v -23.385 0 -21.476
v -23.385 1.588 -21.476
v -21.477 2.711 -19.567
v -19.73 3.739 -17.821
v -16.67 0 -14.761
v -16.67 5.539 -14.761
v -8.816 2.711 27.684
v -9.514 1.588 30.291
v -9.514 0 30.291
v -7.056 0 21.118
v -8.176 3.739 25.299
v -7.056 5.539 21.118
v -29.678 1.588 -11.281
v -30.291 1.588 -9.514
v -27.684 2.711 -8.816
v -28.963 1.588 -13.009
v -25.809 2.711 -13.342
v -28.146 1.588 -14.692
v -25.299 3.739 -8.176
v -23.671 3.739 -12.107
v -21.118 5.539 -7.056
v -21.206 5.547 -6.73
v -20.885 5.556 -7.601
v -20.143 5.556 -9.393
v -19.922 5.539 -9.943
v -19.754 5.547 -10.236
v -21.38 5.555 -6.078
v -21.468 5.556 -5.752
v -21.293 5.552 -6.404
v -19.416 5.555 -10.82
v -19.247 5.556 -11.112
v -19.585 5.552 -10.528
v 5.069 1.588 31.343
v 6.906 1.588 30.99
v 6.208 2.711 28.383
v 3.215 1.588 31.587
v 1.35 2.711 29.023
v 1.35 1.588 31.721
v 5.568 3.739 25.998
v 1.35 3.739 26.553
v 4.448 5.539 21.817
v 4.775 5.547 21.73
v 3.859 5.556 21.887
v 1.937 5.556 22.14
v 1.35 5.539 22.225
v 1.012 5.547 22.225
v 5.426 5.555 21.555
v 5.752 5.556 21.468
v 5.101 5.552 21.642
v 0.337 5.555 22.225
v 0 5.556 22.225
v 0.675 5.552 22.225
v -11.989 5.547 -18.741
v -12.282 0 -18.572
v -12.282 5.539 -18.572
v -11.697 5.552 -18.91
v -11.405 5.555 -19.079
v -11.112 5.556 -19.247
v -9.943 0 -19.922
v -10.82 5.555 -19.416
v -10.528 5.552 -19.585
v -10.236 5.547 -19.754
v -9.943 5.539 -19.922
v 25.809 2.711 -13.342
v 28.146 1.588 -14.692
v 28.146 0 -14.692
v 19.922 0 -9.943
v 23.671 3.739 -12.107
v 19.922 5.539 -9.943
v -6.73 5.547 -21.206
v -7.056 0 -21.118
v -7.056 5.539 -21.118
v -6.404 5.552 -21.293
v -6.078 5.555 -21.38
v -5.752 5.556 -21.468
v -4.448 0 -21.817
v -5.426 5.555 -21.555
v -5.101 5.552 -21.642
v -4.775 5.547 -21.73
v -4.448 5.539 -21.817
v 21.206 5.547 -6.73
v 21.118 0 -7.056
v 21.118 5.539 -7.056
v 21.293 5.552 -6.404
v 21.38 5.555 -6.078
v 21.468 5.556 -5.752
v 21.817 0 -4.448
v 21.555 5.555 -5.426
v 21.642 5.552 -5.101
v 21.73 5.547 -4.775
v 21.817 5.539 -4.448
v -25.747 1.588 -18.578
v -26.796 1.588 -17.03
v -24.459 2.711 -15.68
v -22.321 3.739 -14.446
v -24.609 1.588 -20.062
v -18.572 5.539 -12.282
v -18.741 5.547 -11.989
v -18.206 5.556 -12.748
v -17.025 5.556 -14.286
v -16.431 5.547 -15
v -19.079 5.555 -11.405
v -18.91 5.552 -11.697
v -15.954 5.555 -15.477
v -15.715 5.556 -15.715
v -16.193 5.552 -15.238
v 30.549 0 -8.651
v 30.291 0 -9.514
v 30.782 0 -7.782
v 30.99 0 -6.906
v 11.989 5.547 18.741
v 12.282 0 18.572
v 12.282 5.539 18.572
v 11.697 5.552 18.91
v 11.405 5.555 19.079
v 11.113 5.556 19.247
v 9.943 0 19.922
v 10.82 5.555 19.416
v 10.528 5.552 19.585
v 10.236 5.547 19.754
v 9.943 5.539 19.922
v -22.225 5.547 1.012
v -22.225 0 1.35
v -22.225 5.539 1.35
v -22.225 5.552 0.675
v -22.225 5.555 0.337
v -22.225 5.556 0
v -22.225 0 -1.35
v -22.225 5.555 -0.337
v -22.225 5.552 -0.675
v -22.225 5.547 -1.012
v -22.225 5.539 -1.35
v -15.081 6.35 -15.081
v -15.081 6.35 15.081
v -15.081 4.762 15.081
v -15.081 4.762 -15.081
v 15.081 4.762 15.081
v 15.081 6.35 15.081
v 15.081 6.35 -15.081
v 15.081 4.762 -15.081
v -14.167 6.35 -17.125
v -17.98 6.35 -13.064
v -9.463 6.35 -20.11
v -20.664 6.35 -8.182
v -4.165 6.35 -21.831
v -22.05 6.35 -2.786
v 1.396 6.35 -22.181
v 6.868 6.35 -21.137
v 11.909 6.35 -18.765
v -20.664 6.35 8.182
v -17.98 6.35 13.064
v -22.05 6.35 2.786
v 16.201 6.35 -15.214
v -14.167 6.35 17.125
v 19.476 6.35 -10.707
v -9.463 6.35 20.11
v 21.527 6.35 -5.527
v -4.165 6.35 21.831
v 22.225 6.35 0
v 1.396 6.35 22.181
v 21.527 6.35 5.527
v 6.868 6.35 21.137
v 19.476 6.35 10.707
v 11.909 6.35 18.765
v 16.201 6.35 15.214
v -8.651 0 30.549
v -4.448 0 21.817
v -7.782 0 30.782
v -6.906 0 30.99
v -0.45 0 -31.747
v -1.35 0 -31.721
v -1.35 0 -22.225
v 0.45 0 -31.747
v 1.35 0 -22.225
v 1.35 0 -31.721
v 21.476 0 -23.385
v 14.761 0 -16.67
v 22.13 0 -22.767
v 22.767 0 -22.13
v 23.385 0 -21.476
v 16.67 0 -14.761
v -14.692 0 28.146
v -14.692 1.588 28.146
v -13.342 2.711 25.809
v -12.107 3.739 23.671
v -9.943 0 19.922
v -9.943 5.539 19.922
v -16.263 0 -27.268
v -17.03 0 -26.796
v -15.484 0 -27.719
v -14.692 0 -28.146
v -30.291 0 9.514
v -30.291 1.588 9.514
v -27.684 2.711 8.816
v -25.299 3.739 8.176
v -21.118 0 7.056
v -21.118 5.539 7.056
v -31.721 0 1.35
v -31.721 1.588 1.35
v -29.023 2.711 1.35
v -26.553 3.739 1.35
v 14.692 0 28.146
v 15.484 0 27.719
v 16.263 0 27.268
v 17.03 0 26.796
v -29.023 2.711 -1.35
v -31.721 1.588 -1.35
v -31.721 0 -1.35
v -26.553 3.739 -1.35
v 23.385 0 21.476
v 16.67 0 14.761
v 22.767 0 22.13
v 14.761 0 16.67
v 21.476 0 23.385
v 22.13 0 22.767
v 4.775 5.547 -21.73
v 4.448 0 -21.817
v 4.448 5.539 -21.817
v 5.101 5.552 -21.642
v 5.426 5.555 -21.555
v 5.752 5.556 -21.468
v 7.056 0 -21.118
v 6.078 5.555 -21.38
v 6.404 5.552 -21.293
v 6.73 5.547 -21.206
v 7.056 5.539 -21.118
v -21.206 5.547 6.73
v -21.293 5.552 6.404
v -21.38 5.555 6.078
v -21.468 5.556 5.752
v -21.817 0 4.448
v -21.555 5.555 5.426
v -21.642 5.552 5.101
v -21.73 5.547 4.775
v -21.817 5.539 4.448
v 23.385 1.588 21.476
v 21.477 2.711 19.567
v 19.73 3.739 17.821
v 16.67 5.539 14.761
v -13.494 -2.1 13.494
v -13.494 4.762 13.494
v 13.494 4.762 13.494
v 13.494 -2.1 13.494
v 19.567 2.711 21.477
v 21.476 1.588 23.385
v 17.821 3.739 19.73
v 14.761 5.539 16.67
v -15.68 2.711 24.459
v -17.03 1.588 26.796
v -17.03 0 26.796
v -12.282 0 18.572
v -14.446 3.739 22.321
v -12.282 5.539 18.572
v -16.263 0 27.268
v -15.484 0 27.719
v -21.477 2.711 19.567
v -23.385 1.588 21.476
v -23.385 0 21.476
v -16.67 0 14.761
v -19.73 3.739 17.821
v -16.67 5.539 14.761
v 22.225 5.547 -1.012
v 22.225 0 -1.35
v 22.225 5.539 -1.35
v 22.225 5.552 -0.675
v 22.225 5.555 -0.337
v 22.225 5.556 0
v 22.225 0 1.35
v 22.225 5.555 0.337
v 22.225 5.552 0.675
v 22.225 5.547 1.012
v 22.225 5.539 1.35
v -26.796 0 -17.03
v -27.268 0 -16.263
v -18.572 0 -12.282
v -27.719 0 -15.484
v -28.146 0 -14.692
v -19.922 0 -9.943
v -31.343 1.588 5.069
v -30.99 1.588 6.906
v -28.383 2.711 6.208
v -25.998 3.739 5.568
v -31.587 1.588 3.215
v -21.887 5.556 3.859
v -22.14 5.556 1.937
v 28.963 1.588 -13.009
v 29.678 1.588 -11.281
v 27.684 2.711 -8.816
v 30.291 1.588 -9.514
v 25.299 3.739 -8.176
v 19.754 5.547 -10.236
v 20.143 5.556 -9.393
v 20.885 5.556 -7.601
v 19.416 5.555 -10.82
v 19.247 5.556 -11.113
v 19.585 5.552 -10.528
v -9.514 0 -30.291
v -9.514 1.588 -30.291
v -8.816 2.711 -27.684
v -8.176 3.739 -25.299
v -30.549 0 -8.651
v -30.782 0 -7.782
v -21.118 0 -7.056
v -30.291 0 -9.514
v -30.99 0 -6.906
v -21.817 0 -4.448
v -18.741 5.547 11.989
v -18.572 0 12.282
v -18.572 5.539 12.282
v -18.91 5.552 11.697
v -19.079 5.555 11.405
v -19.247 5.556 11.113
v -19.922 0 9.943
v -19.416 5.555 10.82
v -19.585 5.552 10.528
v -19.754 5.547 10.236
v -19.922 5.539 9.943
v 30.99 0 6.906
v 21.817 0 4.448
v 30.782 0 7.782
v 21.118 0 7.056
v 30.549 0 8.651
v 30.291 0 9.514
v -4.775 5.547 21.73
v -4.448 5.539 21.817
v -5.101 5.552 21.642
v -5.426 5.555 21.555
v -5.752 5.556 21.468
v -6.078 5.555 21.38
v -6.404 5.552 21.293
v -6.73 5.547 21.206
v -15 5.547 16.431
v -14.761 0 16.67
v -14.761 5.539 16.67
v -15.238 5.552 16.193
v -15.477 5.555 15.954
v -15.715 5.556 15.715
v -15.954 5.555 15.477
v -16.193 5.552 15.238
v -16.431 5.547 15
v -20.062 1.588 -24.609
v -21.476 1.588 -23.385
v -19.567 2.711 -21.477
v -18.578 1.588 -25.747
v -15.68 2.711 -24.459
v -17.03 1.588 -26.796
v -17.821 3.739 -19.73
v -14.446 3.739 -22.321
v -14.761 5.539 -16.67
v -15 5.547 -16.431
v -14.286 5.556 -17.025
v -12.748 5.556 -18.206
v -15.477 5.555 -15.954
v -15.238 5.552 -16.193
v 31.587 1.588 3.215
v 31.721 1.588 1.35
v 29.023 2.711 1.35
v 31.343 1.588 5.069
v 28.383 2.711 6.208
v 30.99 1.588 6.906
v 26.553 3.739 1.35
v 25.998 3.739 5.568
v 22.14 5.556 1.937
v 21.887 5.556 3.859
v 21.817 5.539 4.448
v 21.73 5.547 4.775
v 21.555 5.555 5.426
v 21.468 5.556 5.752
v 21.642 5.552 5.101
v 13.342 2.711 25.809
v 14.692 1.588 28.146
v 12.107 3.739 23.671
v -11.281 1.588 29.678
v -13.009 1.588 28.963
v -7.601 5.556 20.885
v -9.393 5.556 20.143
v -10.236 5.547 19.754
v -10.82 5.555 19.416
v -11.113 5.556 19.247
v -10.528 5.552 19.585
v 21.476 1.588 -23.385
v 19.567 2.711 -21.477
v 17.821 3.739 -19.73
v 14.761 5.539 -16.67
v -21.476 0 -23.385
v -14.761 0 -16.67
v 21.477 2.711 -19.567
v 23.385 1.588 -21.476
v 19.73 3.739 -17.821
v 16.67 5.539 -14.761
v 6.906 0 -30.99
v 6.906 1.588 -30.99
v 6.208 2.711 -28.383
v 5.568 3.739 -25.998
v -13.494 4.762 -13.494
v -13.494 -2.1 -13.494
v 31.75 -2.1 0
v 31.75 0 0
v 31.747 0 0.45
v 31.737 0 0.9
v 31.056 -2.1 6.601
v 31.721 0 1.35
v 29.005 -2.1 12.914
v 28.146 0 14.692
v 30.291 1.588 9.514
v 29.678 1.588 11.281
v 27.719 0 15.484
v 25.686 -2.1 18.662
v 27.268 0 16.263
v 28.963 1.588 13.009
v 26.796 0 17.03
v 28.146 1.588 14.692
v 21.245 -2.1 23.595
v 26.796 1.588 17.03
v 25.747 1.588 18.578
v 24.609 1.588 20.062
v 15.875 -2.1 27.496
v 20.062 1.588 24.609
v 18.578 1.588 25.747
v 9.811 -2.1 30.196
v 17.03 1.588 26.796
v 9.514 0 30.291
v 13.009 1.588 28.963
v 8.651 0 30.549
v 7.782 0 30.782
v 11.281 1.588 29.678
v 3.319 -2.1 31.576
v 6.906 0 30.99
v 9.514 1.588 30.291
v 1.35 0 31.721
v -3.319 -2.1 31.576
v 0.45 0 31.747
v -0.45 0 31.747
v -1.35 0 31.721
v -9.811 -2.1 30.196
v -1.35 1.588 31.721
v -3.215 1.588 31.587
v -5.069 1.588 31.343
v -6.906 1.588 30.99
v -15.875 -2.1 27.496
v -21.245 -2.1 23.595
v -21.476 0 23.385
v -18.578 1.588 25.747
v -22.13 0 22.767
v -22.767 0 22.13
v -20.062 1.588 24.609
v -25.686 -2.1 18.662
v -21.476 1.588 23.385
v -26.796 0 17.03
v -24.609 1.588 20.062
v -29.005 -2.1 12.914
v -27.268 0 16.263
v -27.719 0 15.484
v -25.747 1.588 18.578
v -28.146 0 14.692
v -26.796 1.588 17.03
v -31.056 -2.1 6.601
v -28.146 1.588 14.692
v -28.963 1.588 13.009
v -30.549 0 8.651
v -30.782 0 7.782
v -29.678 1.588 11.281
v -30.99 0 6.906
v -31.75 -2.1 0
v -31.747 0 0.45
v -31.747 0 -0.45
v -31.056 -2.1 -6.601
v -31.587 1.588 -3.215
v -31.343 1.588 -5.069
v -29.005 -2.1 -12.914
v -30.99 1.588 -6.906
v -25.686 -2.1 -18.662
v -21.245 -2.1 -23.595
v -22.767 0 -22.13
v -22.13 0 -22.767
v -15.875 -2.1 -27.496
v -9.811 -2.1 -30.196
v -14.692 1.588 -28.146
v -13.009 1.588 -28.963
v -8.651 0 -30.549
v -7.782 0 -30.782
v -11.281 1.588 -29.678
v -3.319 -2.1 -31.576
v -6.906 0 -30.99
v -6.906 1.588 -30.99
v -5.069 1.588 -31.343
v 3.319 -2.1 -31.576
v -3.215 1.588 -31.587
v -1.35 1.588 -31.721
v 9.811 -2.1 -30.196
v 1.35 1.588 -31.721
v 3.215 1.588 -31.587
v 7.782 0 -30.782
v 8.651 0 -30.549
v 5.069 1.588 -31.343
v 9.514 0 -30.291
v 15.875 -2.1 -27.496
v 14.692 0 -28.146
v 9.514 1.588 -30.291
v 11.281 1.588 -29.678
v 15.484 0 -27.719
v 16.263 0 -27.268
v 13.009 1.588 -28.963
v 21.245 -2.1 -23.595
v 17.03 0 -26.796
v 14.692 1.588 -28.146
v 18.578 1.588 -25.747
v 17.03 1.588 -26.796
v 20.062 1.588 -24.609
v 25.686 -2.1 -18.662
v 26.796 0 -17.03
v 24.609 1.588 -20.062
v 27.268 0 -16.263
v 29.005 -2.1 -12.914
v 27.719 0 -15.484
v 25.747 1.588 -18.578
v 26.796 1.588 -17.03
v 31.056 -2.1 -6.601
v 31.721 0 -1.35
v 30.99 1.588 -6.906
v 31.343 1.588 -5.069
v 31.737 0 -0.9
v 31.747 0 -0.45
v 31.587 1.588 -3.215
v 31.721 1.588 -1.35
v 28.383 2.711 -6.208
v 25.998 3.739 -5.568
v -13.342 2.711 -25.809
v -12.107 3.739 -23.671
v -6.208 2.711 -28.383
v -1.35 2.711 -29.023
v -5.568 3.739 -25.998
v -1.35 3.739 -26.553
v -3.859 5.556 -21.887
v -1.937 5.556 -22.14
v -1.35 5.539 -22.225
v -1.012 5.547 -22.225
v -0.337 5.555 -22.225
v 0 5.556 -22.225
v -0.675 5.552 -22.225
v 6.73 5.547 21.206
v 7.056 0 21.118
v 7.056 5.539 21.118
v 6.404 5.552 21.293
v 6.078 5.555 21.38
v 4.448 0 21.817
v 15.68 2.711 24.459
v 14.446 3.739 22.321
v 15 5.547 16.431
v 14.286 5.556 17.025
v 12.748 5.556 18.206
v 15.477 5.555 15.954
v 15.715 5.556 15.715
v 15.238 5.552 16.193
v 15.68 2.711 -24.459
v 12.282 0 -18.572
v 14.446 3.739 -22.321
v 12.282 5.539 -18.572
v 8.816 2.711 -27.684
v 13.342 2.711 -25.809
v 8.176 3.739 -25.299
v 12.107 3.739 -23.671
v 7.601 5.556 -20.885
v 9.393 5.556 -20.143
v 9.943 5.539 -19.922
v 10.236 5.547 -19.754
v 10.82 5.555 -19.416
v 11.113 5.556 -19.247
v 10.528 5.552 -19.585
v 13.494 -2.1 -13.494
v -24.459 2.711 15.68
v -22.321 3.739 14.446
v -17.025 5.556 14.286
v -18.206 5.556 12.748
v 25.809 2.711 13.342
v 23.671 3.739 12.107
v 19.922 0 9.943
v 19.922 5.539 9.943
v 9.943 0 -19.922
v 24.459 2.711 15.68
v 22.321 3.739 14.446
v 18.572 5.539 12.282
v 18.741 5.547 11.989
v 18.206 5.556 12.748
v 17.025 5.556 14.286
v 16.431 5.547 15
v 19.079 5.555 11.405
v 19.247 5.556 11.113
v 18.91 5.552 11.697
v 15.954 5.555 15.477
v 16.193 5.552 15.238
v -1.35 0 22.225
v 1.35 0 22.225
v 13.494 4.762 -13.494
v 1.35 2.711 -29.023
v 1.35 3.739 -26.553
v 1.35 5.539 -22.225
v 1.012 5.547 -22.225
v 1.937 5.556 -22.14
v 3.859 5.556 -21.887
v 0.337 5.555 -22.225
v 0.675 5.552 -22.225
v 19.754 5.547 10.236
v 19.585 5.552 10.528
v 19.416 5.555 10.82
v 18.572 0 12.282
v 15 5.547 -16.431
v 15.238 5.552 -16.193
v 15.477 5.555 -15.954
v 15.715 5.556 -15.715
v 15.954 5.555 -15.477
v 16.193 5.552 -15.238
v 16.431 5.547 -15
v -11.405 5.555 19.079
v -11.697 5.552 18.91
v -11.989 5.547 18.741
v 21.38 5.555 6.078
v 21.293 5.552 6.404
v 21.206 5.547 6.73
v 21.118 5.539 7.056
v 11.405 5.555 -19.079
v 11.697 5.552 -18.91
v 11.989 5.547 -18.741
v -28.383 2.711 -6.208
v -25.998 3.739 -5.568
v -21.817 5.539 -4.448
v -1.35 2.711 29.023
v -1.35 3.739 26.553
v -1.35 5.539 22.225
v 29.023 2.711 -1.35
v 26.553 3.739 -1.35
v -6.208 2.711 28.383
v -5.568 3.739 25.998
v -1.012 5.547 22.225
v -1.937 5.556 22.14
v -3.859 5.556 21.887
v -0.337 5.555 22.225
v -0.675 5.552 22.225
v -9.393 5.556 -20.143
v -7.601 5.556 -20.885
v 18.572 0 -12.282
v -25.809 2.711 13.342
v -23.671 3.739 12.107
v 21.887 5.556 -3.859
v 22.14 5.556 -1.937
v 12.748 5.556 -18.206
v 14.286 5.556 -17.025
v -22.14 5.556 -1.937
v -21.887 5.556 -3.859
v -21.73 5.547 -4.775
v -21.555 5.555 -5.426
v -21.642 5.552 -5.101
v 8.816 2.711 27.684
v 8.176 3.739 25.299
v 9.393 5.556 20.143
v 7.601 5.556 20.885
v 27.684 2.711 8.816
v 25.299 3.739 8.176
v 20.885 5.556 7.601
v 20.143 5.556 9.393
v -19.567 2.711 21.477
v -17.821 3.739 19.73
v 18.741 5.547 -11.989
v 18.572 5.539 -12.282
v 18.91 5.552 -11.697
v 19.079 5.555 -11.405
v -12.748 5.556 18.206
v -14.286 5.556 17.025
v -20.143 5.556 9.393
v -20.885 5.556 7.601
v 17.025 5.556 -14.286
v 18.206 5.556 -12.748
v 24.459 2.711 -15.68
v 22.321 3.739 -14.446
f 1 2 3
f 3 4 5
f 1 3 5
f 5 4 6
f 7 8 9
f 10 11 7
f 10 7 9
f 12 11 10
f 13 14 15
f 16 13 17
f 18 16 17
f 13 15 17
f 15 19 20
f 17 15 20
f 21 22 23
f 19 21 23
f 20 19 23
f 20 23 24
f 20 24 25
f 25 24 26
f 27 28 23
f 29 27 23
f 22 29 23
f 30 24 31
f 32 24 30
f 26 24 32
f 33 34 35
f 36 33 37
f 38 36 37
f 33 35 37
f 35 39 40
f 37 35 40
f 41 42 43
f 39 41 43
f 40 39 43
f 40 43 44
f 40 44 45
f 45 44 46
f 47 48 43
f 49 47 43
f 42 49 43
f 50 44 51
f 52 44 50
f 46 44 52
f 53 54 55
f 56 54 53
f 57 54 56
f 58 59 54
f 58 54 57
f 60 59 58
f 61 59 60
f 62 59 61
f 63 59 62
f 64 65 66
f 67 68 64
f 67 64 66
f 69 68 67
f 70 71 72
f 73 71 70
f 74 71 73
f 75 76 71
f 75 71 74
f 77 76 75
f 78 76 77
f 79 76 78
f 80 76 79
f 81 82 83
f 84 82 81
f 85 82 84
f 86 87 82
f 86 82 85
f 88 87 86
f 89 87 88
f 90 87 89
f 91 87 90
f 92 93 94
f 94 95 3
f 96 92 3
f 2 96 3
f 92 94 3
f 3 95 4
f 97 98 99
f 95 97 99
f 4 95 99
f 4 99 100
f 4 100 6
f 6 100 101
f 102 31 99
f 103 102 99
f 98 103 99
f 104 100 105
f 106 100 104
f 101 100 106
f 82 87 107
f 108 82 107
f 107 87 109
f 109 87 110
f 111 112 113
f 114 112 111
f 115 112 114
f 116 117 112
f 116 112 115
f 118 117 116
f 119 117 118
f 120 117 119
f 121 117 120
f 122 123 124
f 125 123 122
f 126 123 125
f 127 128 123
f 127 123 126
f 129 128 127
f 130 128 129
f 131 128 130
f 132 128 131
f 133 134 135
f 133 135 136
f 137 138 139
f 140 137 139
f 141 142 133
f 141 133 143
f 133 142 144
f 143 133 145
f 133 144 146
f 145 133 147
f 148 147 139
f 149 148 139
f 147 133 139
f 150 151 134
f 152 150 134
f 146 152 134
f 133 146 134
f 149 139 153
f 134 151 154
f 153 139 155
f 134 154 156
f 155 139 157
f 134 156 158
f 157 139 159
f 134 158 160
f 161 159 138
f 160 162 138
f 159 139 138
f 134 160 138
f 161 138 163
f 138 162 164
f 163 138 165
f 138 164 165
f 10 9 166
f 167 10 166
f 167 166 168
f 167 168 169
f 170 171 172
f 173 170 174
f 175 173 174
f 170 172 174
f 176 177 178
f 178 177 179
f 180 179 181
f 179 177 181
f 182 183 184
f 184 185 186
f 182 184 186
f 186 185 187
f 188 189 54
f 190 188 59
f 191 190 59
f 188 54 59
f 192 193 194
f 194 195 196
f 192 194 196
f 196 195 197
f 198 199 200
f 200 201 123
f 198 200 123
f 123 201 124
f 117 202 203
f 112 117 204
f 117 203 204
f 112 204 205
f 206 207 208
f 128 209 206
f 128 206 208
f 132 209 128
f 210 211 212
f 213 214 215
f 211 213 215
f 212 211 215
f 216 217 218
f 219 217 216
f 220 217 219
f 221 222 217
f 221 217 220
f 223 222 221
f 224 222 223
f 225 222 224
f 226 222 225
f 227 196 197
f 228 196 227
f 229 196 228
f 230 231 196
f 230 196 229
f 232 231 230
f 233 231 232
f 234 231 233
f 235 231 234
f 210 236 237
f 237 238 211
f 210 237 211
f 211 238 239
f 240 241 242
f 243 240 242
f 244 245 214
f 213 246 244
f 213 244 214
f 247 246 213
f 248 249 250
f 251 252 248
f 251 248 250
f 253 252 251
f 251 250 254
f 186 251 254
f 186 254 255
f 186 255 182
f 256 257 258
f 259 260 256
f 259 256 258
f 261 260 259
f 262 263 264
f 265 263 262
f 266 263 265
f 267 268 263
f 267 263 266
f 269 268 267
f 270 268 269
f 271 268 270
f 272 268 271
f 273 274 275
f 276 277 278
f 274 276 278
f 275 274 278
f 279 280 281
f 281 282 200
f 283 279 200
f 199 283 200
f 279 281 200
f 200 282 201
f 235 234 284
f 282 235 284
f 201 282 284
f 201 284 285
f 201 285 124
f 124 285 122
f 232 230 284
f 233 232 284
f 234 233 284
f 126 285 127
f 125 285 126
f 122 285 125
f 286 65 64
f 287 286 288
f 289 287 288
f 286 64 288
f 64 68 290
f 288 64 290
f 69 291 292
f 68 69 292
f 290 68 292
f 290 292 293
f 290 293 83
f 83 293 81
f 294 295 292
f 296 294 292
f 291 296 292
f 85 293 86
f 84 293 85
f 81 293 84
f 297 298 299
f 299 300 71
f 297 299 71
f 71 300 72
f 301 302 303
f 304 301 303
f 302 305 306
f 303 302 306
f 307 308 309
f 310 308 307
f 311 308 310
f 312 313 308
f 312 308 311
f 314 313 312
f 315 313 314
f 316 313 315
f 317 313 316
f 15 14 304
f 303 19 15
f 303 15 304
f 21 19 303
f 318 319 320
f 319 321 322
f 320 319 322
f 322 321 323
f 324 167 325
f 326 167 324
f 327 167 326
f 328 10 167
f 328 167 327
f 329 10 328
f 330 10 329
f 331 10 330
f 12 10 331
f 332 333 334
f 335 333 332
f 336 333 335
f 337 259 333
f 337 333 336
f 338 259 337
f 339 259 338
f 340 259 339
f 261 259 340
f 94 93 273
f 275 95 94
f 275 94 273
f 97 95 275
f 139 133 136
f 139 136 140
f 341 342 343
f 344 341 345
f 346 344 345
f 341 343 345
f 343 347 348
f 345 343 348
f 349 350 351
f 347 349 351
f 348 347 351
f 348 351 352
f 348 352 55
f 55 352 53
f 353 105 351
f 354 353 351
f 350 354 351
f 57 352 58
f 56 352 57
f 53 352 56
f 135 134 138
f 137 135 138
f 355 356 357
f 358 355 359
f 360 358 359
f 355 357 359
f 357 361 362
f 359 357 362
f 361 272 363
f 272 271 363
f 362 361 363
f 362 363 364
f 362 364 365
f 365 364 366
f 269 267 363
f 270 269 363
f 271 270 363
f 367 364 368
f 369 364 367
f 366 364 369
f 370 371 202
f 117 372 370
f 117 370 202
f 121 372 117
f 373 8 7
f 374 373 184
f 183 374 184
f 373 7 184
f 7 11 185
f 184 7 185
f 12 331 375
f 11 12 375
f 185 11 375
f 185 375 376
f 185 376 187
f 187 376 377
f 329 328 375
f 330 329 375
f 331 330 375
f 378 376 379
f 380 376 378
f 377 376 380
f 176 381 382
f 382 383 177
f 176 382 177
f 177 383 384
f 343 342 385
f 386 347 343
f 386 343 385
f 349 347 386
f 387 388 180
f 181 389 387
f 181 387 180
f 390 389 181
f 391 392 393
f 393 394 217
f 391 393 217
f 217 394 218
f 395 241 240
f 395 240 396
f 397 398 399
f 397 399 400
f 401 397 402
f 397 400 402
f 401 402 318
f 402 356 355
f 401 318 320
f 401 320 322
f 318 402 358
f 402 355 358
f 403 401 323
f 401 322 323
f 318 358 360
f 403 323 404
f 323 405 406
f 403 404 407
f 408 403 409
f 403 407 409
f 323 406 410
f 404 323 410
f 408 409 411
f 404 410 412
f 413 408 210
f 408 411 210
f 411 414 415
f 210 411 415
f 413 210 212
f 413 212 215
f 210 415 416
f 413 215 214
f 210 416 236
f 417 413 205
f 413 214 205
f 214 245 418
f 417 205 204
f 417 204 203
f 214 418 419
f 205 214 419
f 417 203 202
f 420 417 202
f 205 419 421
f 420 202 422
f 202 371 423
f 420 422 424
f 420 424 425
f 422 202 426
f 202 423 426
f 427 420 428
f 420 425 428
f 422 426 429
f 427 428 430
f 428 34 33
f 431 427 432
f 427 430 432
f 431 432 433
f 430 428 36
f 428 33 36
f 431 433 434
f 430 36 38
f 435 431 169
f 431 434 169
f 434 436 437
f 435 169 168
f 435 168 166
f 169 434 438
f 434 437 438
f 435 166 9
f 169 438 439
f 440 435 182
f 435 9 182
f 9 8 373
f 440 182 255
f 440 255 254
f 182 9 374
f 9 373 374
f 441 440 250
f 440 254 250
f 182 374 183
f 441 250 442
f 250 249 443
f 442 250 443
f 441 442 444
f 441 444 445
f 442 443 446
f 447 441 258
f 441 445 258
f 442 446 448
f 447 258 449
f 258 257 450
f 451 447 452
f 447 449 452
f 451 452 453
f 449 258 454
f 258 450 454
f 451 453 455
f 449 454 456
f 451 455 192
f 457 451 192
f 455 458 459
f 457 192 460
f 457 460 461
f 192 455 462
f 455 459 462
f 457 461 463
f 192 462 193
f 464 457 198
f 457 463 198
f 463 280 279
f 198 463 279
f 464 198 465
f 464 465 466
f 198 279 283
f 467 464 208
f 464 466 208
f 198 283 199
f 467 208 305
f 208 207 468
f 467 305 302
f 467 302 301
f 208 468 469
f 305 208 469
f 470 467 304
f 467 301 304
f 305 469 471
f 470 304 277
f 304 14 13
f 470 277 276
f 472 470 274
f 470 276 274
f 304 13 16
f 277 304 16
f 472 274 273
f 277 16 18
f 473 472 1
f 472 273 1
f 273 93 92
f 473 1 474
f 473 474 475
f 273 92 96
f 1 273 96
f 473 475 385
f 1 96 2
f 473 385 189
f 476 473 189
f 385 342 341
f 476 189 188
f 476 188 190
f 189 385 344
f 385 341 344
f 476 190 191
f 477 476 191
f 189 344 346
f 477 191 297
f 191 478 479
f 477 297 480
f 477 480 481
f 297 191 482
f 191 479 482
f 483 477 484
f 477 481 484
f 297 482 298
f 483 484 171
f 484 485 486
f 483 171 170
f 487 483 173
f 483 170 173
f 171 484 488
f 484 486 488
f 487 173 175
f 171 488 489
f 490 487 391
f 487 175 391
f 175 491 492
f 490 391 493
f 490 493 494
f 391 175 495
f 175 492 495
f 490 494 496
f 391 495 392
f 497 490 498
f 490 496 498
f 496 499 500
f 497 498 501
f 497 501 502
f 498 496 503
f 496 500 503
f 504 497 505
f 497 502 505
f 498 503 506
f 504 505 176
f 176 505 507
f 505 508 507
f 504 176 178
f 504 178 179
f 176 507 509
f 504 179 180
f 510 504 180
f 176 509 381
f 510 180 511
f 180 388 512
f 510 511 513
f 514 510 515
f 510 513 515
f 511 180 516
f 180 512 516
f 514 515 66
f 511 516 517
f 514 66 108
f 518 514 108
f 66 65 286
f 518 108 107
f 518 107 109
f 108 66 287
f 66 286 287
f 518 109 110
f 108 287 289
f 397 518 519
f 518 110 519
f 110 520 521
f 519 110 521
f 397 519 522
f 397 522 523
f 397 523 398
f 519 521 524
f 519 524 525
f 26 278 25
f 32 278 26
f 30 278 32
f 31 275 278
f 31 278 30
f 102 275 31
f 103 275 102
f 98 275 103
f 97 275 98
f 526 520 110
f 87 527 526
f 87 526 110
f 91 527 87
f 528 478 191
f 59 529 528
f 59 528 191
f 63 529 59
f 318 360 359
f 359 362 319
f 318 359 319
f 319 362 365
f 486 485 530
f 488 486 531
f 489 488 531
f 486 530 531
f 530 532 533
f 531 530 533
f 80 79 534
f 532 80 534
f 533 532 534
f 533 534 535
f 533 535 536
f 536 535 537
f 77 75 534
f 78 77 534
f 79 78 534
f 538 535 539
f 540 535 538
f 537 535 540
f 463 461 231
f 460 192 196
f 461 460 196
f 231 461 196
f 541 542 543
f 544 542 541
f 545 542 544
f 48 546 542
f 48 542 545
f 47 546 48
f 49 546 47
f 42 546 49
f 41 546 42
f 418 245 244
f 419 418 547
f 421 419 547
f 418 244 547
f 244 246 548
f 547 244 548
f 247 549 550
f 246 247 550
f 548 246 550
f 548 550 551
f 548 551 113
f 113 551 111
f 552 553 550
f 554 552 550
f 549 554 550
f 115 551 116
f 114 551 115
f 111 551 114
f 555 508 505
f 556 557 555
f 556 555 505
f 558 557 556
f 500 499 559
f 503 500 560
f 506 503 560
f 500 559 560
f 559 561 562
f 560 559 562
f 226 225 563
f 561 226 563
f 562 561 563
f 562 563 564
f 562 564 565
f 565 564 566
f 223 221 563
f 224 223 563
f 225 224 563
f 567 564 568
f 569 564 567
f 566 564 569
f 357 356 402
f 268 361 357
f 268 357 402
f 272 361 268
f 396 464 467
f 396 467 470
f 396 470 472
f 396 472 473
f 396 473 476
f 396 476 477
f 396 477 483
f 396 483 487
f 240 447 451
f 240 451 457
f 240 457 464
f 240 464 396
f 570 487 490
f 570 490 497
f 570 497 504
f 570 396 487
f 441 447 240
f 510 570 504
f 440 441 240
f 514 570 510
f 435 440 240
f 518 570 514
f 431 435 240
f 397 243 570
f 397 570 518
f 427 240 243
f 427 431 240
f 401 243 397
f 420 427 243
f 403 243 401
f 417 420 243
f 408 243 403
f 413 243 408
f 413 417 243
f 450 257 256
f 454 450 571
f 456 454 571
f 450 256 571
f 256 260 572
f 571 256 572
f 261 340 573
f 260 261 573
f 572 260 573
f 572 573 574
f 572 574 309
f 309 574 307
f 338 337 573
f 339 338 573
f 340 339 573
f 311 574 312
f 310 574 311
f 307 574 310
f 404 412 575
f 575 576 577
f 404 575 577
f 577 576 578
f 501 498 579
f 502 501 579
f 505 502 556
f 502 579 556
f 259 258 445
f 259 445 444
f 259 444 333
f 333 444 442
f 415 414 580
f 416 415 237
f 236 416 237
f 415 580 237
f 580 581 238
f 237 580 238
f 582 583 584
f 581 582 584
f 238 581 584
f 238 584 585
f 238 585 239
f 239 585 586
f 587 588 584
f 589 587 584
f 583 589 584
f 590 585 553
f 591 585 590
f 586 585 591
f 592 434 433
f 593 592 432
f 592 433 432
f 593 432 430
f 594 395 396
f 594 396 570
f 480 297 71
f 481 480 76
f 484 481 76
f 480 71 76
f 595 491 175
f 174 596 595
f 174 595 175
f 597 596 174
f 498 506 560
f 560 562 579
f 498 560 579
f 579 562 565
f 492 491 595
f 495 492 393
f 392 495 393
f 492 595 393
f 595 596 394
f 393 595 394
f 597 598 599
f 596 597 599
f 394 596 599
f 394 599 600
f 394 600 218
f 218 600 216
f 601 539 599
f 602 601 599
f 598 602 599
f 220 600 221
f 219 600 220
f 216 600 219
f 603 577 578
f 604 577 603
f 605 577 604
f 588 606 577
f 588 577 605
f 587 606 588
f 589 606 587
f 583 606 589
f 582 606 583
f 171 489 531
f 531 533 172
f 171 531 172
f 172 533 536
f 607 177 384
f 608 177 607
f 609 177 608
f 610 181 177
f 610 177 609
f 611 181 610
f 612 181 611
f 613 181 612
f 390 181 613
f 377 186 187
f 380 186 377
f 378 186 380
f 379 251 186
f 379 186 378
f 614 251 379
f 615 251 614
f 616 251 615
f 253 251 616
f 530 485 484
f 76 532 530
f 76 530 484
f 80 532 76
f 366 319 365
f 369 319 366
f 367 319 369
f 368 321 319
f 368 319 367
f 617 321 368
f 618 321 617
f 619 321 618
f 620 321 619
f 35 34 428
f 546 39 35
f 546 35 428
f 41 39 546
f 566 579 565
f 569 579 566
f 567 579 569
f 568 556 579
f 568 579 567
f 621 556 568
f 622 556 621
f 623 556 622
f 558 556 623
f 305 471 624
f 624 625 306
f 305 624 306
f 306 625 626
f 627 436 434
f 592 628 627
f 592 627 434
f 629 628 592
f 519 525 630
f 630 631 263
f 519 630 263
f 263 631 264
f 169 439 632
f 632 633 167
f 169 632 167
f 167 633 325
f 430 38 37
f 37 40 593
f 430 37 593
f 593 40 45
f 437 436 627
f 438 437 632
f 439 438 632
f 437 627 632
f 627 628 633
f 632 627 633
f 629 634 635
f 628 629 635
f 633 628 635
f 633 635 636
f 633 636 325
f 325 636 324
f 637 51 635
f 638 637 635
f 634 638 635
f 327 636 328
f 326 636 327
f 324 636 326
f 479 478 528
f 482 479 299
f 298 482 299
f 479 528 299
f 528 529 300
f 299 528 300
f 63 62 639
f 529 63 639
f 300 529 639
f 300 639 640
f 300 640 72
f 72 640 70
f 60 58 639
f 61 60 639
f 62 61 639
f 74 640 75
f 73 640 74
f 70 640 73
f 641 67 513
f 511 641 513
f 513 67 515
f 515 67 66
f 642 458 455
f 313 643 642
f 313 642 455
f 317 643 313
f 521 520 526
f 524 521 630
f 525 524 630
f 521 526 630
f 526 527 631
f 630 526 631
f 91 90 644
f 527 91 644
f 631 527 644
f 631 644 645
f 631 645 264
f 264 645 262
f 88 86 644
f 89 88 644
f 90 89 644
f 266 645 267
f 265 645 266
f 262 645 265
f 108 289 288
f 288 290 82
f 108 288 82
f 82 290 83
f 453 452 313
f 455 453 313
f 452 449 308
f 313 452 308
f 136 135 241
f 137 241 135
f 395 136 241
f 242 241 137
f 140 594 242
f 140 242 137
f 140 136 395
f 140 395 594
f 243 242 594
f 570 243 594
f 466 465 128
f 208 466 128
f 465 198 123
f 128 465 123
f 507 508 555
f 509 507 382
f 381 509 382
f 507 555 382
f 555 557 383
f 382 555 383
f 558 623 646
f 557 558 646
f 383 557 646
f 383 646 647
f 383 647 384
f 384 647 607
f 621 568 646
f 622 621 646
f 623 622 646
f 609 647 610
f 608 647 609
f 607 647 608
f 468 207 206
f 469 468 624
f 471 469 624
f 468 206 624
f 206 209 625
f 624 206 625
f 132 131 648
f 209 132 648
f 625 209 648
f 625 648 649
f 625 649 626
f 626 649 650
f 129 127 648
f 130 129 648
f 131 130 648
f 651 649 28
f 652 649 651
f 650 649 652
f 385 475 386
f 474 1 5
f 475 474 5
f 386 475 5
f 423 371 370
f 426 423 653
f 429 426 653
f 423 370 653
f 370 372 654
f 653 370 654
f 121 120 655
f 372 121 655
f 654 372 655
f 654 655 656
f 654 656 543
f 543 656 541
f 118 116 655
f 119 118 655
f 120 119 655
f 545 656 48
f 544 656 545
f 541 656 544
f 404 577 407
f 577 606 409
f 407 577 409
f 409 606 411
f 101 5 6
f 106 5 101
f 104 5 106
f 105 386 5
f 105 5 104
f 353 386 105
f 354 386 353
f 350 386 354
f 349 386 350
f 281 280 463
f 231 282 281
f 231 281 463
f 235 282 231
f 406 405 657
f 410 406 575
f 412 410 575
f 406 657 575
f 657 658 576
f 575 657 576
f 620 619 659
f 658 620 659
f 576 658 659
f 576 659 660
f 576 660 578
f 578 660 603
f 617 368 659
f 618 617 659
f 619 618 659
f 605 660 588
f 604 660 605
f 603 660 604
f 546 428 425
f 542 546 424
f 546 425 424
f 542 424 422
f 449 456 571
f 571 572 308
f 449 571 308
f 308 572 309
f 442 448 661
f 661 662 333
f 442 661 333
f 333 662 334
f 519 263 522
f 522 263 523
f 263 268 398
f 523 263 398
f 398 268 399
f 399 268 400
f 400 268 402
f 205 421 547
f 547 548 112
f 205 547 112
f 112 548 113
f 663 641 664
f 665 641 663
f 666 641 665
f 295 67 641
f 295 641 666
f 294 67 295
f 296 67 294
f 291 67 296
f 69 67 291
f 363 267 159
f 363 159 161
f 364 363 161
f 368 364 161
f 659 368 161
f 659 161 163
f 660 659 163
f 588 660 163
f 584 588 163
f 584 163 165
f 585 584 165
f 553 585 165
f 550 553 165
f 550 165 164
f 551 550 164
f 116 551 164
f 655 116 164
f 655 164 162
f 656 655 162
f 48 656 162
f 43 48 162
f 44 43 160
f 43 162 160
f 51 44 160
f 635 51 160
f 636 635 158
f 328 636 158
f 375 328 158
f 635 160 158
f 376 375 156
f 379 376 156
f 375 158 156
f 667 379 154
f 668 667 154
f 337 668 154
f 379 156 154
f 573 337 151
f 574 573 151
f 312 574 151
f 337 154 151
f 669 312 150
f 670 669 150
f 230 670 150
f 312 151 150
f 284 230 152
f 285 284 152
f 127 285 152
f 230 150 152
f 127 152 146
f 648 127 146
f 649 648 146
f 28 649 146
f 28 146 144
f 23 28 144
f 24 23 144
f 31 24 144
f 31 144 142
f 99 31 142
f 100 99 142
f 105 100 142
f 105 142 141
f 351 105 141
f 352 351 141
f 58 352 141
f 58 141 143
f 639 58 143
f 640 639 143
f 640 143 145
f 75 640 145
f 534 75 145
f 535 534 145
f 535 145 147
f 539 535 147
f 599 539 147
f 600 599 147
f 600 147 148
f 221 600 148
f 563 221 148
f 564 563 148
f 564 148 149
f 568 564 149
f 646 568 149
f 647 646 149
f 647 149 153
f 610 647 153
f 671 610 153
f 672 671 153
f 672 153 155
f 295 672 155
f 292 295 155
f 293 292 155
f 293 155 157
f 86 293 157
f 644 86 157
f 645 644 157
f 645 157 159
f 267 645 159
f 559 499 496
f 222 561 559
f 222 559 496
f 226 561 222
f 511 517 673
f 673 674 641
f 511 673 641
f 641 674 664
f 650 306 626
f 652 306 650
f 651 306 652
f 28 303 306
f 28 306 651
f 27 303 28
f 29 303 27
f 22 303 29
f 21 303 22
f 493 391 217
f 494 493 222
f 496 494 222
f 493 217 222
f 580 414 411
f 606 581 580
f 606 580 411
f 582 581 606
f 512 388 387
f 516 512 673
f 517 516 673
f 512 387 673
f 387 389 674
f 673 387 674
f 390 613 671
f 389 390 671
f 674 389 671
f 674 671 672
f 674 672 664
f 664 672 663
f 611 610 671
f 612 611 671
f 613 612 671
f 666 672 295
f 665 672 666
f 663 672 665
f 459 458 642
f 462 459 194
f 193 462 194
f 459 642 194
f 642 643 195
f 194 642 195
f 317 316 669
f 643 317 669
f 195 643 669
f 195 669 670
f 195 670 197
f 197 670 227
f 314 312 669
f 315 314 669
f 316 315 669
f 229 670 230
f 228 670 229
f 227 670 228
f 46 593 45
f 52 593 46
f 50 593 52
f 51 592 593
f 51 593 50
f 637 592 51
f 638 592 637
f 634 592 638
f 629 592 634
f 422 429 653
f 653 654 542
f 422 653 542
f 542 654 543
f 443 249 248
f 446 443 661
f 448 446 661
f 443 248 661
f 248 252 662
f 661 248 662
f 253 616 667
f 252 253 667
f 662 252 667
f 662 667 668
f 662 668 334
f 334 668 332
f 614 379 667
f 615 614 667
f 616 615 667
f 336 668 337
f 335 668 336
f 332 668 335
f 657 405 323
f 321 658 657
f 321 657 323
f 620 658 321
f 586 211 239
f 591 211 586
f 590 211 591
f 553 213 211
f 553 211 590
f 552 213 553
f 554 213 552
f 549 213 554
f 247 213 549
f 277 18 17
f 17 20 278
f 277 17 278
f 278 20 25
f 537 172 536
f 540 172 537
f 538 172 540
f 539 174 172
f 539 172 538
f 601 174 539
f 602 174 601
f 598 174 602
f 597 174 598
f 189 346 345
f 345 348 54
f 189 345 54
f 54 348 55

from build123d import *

# Parameters (mm, degrees)
CUT_EXTRUDE1_DEPTH  = 1.349999904
CIRPATTERN1_COUNT   = 24
SKETCH17_R          = 31.75
BOSS_EXTRUDE1_DEPTH = 2.1
SKETCH15_W          = 26.9875
SKETCH15_H          = 26.9875
CUT_EXTRUDE2_DEPTH  = 9.45
SKETCH16_W          = 30.1625
SKETCH16_H          = 30.1625
CUT_EXTRUDE3_DEPTH  = 1.5875


with BuildPart() as part:
    # Sketch2 → Revolve1 (revolve)
    with BuildSketch(Plane.XY):
        Polygon((0, 0), (31.75, 0), (31.75, 1.5875), (22.225, 5.55625), (22.225, 6.35), (0, 6.35), align=None)
    revolve(axis=Axis((0, 6.35, 0), (0, -1, 0)))

    # Sketch3 → Cut-Extrude1 (cut, symmetric)
    with BuildSketch(Plane.XY):
        Polygon((22.225, 6.35), (31.75, 2.38125), (31.75, 0), (22.225, 0), align=None)
    cut_extrude1 = extrude(amount=CUT_EXTRUDE1_DEPTH, both=True, mode=Mode.SUBTRACT)

    # CirPattern1: Cut-Extrude1 ×24 about axis
    cirpattern1_axis = Axis((0, 0, 0), (0, 1, 0))
    for i in range(1, CIRPATTERN1_COUNT):
        add(cut_extrude1.rotate(cirpattern1_axis, i * 360 / CIRPATTERN1_COUNT), mode=Mode.SUBTRACT)

    # Sketch17 → Boss-Extrude1 (add)
    with BuildSketch(Plane.XZ):
        Circle(SKETCH17_R)
    extrude(amount=BOSS_EXTRUDE1_DEPTH)

    # Sketch15 → Cut-Extrude2 (cut, through all)
    with BuildSketch(Plane(origin=(0, 6.35, 0), x_dir=(1, 0, 0), z_dir=(0, 1, 0))):
        Rectangle(SKETCH15_W, SKETCH15_H)
    extrude(amount=-CUT_EXTRUDE2_DEPTH, mode=Mode.SUBTRACT)

    # Sketch16 → Cut-Extrude3 (cut)
    with BuildSketch(Plane(origin=(0, 6.35, 0), x_dir=(1, 0, 0), z_dir=(0, 1, 0))):
        Rectangle(SKETCH16_W, SKETCH16_H)
    extrude(amount=-CUT_EXTRUDE3_DEPTH, mode=Mode.SUBTRACT)


solid = part.part
